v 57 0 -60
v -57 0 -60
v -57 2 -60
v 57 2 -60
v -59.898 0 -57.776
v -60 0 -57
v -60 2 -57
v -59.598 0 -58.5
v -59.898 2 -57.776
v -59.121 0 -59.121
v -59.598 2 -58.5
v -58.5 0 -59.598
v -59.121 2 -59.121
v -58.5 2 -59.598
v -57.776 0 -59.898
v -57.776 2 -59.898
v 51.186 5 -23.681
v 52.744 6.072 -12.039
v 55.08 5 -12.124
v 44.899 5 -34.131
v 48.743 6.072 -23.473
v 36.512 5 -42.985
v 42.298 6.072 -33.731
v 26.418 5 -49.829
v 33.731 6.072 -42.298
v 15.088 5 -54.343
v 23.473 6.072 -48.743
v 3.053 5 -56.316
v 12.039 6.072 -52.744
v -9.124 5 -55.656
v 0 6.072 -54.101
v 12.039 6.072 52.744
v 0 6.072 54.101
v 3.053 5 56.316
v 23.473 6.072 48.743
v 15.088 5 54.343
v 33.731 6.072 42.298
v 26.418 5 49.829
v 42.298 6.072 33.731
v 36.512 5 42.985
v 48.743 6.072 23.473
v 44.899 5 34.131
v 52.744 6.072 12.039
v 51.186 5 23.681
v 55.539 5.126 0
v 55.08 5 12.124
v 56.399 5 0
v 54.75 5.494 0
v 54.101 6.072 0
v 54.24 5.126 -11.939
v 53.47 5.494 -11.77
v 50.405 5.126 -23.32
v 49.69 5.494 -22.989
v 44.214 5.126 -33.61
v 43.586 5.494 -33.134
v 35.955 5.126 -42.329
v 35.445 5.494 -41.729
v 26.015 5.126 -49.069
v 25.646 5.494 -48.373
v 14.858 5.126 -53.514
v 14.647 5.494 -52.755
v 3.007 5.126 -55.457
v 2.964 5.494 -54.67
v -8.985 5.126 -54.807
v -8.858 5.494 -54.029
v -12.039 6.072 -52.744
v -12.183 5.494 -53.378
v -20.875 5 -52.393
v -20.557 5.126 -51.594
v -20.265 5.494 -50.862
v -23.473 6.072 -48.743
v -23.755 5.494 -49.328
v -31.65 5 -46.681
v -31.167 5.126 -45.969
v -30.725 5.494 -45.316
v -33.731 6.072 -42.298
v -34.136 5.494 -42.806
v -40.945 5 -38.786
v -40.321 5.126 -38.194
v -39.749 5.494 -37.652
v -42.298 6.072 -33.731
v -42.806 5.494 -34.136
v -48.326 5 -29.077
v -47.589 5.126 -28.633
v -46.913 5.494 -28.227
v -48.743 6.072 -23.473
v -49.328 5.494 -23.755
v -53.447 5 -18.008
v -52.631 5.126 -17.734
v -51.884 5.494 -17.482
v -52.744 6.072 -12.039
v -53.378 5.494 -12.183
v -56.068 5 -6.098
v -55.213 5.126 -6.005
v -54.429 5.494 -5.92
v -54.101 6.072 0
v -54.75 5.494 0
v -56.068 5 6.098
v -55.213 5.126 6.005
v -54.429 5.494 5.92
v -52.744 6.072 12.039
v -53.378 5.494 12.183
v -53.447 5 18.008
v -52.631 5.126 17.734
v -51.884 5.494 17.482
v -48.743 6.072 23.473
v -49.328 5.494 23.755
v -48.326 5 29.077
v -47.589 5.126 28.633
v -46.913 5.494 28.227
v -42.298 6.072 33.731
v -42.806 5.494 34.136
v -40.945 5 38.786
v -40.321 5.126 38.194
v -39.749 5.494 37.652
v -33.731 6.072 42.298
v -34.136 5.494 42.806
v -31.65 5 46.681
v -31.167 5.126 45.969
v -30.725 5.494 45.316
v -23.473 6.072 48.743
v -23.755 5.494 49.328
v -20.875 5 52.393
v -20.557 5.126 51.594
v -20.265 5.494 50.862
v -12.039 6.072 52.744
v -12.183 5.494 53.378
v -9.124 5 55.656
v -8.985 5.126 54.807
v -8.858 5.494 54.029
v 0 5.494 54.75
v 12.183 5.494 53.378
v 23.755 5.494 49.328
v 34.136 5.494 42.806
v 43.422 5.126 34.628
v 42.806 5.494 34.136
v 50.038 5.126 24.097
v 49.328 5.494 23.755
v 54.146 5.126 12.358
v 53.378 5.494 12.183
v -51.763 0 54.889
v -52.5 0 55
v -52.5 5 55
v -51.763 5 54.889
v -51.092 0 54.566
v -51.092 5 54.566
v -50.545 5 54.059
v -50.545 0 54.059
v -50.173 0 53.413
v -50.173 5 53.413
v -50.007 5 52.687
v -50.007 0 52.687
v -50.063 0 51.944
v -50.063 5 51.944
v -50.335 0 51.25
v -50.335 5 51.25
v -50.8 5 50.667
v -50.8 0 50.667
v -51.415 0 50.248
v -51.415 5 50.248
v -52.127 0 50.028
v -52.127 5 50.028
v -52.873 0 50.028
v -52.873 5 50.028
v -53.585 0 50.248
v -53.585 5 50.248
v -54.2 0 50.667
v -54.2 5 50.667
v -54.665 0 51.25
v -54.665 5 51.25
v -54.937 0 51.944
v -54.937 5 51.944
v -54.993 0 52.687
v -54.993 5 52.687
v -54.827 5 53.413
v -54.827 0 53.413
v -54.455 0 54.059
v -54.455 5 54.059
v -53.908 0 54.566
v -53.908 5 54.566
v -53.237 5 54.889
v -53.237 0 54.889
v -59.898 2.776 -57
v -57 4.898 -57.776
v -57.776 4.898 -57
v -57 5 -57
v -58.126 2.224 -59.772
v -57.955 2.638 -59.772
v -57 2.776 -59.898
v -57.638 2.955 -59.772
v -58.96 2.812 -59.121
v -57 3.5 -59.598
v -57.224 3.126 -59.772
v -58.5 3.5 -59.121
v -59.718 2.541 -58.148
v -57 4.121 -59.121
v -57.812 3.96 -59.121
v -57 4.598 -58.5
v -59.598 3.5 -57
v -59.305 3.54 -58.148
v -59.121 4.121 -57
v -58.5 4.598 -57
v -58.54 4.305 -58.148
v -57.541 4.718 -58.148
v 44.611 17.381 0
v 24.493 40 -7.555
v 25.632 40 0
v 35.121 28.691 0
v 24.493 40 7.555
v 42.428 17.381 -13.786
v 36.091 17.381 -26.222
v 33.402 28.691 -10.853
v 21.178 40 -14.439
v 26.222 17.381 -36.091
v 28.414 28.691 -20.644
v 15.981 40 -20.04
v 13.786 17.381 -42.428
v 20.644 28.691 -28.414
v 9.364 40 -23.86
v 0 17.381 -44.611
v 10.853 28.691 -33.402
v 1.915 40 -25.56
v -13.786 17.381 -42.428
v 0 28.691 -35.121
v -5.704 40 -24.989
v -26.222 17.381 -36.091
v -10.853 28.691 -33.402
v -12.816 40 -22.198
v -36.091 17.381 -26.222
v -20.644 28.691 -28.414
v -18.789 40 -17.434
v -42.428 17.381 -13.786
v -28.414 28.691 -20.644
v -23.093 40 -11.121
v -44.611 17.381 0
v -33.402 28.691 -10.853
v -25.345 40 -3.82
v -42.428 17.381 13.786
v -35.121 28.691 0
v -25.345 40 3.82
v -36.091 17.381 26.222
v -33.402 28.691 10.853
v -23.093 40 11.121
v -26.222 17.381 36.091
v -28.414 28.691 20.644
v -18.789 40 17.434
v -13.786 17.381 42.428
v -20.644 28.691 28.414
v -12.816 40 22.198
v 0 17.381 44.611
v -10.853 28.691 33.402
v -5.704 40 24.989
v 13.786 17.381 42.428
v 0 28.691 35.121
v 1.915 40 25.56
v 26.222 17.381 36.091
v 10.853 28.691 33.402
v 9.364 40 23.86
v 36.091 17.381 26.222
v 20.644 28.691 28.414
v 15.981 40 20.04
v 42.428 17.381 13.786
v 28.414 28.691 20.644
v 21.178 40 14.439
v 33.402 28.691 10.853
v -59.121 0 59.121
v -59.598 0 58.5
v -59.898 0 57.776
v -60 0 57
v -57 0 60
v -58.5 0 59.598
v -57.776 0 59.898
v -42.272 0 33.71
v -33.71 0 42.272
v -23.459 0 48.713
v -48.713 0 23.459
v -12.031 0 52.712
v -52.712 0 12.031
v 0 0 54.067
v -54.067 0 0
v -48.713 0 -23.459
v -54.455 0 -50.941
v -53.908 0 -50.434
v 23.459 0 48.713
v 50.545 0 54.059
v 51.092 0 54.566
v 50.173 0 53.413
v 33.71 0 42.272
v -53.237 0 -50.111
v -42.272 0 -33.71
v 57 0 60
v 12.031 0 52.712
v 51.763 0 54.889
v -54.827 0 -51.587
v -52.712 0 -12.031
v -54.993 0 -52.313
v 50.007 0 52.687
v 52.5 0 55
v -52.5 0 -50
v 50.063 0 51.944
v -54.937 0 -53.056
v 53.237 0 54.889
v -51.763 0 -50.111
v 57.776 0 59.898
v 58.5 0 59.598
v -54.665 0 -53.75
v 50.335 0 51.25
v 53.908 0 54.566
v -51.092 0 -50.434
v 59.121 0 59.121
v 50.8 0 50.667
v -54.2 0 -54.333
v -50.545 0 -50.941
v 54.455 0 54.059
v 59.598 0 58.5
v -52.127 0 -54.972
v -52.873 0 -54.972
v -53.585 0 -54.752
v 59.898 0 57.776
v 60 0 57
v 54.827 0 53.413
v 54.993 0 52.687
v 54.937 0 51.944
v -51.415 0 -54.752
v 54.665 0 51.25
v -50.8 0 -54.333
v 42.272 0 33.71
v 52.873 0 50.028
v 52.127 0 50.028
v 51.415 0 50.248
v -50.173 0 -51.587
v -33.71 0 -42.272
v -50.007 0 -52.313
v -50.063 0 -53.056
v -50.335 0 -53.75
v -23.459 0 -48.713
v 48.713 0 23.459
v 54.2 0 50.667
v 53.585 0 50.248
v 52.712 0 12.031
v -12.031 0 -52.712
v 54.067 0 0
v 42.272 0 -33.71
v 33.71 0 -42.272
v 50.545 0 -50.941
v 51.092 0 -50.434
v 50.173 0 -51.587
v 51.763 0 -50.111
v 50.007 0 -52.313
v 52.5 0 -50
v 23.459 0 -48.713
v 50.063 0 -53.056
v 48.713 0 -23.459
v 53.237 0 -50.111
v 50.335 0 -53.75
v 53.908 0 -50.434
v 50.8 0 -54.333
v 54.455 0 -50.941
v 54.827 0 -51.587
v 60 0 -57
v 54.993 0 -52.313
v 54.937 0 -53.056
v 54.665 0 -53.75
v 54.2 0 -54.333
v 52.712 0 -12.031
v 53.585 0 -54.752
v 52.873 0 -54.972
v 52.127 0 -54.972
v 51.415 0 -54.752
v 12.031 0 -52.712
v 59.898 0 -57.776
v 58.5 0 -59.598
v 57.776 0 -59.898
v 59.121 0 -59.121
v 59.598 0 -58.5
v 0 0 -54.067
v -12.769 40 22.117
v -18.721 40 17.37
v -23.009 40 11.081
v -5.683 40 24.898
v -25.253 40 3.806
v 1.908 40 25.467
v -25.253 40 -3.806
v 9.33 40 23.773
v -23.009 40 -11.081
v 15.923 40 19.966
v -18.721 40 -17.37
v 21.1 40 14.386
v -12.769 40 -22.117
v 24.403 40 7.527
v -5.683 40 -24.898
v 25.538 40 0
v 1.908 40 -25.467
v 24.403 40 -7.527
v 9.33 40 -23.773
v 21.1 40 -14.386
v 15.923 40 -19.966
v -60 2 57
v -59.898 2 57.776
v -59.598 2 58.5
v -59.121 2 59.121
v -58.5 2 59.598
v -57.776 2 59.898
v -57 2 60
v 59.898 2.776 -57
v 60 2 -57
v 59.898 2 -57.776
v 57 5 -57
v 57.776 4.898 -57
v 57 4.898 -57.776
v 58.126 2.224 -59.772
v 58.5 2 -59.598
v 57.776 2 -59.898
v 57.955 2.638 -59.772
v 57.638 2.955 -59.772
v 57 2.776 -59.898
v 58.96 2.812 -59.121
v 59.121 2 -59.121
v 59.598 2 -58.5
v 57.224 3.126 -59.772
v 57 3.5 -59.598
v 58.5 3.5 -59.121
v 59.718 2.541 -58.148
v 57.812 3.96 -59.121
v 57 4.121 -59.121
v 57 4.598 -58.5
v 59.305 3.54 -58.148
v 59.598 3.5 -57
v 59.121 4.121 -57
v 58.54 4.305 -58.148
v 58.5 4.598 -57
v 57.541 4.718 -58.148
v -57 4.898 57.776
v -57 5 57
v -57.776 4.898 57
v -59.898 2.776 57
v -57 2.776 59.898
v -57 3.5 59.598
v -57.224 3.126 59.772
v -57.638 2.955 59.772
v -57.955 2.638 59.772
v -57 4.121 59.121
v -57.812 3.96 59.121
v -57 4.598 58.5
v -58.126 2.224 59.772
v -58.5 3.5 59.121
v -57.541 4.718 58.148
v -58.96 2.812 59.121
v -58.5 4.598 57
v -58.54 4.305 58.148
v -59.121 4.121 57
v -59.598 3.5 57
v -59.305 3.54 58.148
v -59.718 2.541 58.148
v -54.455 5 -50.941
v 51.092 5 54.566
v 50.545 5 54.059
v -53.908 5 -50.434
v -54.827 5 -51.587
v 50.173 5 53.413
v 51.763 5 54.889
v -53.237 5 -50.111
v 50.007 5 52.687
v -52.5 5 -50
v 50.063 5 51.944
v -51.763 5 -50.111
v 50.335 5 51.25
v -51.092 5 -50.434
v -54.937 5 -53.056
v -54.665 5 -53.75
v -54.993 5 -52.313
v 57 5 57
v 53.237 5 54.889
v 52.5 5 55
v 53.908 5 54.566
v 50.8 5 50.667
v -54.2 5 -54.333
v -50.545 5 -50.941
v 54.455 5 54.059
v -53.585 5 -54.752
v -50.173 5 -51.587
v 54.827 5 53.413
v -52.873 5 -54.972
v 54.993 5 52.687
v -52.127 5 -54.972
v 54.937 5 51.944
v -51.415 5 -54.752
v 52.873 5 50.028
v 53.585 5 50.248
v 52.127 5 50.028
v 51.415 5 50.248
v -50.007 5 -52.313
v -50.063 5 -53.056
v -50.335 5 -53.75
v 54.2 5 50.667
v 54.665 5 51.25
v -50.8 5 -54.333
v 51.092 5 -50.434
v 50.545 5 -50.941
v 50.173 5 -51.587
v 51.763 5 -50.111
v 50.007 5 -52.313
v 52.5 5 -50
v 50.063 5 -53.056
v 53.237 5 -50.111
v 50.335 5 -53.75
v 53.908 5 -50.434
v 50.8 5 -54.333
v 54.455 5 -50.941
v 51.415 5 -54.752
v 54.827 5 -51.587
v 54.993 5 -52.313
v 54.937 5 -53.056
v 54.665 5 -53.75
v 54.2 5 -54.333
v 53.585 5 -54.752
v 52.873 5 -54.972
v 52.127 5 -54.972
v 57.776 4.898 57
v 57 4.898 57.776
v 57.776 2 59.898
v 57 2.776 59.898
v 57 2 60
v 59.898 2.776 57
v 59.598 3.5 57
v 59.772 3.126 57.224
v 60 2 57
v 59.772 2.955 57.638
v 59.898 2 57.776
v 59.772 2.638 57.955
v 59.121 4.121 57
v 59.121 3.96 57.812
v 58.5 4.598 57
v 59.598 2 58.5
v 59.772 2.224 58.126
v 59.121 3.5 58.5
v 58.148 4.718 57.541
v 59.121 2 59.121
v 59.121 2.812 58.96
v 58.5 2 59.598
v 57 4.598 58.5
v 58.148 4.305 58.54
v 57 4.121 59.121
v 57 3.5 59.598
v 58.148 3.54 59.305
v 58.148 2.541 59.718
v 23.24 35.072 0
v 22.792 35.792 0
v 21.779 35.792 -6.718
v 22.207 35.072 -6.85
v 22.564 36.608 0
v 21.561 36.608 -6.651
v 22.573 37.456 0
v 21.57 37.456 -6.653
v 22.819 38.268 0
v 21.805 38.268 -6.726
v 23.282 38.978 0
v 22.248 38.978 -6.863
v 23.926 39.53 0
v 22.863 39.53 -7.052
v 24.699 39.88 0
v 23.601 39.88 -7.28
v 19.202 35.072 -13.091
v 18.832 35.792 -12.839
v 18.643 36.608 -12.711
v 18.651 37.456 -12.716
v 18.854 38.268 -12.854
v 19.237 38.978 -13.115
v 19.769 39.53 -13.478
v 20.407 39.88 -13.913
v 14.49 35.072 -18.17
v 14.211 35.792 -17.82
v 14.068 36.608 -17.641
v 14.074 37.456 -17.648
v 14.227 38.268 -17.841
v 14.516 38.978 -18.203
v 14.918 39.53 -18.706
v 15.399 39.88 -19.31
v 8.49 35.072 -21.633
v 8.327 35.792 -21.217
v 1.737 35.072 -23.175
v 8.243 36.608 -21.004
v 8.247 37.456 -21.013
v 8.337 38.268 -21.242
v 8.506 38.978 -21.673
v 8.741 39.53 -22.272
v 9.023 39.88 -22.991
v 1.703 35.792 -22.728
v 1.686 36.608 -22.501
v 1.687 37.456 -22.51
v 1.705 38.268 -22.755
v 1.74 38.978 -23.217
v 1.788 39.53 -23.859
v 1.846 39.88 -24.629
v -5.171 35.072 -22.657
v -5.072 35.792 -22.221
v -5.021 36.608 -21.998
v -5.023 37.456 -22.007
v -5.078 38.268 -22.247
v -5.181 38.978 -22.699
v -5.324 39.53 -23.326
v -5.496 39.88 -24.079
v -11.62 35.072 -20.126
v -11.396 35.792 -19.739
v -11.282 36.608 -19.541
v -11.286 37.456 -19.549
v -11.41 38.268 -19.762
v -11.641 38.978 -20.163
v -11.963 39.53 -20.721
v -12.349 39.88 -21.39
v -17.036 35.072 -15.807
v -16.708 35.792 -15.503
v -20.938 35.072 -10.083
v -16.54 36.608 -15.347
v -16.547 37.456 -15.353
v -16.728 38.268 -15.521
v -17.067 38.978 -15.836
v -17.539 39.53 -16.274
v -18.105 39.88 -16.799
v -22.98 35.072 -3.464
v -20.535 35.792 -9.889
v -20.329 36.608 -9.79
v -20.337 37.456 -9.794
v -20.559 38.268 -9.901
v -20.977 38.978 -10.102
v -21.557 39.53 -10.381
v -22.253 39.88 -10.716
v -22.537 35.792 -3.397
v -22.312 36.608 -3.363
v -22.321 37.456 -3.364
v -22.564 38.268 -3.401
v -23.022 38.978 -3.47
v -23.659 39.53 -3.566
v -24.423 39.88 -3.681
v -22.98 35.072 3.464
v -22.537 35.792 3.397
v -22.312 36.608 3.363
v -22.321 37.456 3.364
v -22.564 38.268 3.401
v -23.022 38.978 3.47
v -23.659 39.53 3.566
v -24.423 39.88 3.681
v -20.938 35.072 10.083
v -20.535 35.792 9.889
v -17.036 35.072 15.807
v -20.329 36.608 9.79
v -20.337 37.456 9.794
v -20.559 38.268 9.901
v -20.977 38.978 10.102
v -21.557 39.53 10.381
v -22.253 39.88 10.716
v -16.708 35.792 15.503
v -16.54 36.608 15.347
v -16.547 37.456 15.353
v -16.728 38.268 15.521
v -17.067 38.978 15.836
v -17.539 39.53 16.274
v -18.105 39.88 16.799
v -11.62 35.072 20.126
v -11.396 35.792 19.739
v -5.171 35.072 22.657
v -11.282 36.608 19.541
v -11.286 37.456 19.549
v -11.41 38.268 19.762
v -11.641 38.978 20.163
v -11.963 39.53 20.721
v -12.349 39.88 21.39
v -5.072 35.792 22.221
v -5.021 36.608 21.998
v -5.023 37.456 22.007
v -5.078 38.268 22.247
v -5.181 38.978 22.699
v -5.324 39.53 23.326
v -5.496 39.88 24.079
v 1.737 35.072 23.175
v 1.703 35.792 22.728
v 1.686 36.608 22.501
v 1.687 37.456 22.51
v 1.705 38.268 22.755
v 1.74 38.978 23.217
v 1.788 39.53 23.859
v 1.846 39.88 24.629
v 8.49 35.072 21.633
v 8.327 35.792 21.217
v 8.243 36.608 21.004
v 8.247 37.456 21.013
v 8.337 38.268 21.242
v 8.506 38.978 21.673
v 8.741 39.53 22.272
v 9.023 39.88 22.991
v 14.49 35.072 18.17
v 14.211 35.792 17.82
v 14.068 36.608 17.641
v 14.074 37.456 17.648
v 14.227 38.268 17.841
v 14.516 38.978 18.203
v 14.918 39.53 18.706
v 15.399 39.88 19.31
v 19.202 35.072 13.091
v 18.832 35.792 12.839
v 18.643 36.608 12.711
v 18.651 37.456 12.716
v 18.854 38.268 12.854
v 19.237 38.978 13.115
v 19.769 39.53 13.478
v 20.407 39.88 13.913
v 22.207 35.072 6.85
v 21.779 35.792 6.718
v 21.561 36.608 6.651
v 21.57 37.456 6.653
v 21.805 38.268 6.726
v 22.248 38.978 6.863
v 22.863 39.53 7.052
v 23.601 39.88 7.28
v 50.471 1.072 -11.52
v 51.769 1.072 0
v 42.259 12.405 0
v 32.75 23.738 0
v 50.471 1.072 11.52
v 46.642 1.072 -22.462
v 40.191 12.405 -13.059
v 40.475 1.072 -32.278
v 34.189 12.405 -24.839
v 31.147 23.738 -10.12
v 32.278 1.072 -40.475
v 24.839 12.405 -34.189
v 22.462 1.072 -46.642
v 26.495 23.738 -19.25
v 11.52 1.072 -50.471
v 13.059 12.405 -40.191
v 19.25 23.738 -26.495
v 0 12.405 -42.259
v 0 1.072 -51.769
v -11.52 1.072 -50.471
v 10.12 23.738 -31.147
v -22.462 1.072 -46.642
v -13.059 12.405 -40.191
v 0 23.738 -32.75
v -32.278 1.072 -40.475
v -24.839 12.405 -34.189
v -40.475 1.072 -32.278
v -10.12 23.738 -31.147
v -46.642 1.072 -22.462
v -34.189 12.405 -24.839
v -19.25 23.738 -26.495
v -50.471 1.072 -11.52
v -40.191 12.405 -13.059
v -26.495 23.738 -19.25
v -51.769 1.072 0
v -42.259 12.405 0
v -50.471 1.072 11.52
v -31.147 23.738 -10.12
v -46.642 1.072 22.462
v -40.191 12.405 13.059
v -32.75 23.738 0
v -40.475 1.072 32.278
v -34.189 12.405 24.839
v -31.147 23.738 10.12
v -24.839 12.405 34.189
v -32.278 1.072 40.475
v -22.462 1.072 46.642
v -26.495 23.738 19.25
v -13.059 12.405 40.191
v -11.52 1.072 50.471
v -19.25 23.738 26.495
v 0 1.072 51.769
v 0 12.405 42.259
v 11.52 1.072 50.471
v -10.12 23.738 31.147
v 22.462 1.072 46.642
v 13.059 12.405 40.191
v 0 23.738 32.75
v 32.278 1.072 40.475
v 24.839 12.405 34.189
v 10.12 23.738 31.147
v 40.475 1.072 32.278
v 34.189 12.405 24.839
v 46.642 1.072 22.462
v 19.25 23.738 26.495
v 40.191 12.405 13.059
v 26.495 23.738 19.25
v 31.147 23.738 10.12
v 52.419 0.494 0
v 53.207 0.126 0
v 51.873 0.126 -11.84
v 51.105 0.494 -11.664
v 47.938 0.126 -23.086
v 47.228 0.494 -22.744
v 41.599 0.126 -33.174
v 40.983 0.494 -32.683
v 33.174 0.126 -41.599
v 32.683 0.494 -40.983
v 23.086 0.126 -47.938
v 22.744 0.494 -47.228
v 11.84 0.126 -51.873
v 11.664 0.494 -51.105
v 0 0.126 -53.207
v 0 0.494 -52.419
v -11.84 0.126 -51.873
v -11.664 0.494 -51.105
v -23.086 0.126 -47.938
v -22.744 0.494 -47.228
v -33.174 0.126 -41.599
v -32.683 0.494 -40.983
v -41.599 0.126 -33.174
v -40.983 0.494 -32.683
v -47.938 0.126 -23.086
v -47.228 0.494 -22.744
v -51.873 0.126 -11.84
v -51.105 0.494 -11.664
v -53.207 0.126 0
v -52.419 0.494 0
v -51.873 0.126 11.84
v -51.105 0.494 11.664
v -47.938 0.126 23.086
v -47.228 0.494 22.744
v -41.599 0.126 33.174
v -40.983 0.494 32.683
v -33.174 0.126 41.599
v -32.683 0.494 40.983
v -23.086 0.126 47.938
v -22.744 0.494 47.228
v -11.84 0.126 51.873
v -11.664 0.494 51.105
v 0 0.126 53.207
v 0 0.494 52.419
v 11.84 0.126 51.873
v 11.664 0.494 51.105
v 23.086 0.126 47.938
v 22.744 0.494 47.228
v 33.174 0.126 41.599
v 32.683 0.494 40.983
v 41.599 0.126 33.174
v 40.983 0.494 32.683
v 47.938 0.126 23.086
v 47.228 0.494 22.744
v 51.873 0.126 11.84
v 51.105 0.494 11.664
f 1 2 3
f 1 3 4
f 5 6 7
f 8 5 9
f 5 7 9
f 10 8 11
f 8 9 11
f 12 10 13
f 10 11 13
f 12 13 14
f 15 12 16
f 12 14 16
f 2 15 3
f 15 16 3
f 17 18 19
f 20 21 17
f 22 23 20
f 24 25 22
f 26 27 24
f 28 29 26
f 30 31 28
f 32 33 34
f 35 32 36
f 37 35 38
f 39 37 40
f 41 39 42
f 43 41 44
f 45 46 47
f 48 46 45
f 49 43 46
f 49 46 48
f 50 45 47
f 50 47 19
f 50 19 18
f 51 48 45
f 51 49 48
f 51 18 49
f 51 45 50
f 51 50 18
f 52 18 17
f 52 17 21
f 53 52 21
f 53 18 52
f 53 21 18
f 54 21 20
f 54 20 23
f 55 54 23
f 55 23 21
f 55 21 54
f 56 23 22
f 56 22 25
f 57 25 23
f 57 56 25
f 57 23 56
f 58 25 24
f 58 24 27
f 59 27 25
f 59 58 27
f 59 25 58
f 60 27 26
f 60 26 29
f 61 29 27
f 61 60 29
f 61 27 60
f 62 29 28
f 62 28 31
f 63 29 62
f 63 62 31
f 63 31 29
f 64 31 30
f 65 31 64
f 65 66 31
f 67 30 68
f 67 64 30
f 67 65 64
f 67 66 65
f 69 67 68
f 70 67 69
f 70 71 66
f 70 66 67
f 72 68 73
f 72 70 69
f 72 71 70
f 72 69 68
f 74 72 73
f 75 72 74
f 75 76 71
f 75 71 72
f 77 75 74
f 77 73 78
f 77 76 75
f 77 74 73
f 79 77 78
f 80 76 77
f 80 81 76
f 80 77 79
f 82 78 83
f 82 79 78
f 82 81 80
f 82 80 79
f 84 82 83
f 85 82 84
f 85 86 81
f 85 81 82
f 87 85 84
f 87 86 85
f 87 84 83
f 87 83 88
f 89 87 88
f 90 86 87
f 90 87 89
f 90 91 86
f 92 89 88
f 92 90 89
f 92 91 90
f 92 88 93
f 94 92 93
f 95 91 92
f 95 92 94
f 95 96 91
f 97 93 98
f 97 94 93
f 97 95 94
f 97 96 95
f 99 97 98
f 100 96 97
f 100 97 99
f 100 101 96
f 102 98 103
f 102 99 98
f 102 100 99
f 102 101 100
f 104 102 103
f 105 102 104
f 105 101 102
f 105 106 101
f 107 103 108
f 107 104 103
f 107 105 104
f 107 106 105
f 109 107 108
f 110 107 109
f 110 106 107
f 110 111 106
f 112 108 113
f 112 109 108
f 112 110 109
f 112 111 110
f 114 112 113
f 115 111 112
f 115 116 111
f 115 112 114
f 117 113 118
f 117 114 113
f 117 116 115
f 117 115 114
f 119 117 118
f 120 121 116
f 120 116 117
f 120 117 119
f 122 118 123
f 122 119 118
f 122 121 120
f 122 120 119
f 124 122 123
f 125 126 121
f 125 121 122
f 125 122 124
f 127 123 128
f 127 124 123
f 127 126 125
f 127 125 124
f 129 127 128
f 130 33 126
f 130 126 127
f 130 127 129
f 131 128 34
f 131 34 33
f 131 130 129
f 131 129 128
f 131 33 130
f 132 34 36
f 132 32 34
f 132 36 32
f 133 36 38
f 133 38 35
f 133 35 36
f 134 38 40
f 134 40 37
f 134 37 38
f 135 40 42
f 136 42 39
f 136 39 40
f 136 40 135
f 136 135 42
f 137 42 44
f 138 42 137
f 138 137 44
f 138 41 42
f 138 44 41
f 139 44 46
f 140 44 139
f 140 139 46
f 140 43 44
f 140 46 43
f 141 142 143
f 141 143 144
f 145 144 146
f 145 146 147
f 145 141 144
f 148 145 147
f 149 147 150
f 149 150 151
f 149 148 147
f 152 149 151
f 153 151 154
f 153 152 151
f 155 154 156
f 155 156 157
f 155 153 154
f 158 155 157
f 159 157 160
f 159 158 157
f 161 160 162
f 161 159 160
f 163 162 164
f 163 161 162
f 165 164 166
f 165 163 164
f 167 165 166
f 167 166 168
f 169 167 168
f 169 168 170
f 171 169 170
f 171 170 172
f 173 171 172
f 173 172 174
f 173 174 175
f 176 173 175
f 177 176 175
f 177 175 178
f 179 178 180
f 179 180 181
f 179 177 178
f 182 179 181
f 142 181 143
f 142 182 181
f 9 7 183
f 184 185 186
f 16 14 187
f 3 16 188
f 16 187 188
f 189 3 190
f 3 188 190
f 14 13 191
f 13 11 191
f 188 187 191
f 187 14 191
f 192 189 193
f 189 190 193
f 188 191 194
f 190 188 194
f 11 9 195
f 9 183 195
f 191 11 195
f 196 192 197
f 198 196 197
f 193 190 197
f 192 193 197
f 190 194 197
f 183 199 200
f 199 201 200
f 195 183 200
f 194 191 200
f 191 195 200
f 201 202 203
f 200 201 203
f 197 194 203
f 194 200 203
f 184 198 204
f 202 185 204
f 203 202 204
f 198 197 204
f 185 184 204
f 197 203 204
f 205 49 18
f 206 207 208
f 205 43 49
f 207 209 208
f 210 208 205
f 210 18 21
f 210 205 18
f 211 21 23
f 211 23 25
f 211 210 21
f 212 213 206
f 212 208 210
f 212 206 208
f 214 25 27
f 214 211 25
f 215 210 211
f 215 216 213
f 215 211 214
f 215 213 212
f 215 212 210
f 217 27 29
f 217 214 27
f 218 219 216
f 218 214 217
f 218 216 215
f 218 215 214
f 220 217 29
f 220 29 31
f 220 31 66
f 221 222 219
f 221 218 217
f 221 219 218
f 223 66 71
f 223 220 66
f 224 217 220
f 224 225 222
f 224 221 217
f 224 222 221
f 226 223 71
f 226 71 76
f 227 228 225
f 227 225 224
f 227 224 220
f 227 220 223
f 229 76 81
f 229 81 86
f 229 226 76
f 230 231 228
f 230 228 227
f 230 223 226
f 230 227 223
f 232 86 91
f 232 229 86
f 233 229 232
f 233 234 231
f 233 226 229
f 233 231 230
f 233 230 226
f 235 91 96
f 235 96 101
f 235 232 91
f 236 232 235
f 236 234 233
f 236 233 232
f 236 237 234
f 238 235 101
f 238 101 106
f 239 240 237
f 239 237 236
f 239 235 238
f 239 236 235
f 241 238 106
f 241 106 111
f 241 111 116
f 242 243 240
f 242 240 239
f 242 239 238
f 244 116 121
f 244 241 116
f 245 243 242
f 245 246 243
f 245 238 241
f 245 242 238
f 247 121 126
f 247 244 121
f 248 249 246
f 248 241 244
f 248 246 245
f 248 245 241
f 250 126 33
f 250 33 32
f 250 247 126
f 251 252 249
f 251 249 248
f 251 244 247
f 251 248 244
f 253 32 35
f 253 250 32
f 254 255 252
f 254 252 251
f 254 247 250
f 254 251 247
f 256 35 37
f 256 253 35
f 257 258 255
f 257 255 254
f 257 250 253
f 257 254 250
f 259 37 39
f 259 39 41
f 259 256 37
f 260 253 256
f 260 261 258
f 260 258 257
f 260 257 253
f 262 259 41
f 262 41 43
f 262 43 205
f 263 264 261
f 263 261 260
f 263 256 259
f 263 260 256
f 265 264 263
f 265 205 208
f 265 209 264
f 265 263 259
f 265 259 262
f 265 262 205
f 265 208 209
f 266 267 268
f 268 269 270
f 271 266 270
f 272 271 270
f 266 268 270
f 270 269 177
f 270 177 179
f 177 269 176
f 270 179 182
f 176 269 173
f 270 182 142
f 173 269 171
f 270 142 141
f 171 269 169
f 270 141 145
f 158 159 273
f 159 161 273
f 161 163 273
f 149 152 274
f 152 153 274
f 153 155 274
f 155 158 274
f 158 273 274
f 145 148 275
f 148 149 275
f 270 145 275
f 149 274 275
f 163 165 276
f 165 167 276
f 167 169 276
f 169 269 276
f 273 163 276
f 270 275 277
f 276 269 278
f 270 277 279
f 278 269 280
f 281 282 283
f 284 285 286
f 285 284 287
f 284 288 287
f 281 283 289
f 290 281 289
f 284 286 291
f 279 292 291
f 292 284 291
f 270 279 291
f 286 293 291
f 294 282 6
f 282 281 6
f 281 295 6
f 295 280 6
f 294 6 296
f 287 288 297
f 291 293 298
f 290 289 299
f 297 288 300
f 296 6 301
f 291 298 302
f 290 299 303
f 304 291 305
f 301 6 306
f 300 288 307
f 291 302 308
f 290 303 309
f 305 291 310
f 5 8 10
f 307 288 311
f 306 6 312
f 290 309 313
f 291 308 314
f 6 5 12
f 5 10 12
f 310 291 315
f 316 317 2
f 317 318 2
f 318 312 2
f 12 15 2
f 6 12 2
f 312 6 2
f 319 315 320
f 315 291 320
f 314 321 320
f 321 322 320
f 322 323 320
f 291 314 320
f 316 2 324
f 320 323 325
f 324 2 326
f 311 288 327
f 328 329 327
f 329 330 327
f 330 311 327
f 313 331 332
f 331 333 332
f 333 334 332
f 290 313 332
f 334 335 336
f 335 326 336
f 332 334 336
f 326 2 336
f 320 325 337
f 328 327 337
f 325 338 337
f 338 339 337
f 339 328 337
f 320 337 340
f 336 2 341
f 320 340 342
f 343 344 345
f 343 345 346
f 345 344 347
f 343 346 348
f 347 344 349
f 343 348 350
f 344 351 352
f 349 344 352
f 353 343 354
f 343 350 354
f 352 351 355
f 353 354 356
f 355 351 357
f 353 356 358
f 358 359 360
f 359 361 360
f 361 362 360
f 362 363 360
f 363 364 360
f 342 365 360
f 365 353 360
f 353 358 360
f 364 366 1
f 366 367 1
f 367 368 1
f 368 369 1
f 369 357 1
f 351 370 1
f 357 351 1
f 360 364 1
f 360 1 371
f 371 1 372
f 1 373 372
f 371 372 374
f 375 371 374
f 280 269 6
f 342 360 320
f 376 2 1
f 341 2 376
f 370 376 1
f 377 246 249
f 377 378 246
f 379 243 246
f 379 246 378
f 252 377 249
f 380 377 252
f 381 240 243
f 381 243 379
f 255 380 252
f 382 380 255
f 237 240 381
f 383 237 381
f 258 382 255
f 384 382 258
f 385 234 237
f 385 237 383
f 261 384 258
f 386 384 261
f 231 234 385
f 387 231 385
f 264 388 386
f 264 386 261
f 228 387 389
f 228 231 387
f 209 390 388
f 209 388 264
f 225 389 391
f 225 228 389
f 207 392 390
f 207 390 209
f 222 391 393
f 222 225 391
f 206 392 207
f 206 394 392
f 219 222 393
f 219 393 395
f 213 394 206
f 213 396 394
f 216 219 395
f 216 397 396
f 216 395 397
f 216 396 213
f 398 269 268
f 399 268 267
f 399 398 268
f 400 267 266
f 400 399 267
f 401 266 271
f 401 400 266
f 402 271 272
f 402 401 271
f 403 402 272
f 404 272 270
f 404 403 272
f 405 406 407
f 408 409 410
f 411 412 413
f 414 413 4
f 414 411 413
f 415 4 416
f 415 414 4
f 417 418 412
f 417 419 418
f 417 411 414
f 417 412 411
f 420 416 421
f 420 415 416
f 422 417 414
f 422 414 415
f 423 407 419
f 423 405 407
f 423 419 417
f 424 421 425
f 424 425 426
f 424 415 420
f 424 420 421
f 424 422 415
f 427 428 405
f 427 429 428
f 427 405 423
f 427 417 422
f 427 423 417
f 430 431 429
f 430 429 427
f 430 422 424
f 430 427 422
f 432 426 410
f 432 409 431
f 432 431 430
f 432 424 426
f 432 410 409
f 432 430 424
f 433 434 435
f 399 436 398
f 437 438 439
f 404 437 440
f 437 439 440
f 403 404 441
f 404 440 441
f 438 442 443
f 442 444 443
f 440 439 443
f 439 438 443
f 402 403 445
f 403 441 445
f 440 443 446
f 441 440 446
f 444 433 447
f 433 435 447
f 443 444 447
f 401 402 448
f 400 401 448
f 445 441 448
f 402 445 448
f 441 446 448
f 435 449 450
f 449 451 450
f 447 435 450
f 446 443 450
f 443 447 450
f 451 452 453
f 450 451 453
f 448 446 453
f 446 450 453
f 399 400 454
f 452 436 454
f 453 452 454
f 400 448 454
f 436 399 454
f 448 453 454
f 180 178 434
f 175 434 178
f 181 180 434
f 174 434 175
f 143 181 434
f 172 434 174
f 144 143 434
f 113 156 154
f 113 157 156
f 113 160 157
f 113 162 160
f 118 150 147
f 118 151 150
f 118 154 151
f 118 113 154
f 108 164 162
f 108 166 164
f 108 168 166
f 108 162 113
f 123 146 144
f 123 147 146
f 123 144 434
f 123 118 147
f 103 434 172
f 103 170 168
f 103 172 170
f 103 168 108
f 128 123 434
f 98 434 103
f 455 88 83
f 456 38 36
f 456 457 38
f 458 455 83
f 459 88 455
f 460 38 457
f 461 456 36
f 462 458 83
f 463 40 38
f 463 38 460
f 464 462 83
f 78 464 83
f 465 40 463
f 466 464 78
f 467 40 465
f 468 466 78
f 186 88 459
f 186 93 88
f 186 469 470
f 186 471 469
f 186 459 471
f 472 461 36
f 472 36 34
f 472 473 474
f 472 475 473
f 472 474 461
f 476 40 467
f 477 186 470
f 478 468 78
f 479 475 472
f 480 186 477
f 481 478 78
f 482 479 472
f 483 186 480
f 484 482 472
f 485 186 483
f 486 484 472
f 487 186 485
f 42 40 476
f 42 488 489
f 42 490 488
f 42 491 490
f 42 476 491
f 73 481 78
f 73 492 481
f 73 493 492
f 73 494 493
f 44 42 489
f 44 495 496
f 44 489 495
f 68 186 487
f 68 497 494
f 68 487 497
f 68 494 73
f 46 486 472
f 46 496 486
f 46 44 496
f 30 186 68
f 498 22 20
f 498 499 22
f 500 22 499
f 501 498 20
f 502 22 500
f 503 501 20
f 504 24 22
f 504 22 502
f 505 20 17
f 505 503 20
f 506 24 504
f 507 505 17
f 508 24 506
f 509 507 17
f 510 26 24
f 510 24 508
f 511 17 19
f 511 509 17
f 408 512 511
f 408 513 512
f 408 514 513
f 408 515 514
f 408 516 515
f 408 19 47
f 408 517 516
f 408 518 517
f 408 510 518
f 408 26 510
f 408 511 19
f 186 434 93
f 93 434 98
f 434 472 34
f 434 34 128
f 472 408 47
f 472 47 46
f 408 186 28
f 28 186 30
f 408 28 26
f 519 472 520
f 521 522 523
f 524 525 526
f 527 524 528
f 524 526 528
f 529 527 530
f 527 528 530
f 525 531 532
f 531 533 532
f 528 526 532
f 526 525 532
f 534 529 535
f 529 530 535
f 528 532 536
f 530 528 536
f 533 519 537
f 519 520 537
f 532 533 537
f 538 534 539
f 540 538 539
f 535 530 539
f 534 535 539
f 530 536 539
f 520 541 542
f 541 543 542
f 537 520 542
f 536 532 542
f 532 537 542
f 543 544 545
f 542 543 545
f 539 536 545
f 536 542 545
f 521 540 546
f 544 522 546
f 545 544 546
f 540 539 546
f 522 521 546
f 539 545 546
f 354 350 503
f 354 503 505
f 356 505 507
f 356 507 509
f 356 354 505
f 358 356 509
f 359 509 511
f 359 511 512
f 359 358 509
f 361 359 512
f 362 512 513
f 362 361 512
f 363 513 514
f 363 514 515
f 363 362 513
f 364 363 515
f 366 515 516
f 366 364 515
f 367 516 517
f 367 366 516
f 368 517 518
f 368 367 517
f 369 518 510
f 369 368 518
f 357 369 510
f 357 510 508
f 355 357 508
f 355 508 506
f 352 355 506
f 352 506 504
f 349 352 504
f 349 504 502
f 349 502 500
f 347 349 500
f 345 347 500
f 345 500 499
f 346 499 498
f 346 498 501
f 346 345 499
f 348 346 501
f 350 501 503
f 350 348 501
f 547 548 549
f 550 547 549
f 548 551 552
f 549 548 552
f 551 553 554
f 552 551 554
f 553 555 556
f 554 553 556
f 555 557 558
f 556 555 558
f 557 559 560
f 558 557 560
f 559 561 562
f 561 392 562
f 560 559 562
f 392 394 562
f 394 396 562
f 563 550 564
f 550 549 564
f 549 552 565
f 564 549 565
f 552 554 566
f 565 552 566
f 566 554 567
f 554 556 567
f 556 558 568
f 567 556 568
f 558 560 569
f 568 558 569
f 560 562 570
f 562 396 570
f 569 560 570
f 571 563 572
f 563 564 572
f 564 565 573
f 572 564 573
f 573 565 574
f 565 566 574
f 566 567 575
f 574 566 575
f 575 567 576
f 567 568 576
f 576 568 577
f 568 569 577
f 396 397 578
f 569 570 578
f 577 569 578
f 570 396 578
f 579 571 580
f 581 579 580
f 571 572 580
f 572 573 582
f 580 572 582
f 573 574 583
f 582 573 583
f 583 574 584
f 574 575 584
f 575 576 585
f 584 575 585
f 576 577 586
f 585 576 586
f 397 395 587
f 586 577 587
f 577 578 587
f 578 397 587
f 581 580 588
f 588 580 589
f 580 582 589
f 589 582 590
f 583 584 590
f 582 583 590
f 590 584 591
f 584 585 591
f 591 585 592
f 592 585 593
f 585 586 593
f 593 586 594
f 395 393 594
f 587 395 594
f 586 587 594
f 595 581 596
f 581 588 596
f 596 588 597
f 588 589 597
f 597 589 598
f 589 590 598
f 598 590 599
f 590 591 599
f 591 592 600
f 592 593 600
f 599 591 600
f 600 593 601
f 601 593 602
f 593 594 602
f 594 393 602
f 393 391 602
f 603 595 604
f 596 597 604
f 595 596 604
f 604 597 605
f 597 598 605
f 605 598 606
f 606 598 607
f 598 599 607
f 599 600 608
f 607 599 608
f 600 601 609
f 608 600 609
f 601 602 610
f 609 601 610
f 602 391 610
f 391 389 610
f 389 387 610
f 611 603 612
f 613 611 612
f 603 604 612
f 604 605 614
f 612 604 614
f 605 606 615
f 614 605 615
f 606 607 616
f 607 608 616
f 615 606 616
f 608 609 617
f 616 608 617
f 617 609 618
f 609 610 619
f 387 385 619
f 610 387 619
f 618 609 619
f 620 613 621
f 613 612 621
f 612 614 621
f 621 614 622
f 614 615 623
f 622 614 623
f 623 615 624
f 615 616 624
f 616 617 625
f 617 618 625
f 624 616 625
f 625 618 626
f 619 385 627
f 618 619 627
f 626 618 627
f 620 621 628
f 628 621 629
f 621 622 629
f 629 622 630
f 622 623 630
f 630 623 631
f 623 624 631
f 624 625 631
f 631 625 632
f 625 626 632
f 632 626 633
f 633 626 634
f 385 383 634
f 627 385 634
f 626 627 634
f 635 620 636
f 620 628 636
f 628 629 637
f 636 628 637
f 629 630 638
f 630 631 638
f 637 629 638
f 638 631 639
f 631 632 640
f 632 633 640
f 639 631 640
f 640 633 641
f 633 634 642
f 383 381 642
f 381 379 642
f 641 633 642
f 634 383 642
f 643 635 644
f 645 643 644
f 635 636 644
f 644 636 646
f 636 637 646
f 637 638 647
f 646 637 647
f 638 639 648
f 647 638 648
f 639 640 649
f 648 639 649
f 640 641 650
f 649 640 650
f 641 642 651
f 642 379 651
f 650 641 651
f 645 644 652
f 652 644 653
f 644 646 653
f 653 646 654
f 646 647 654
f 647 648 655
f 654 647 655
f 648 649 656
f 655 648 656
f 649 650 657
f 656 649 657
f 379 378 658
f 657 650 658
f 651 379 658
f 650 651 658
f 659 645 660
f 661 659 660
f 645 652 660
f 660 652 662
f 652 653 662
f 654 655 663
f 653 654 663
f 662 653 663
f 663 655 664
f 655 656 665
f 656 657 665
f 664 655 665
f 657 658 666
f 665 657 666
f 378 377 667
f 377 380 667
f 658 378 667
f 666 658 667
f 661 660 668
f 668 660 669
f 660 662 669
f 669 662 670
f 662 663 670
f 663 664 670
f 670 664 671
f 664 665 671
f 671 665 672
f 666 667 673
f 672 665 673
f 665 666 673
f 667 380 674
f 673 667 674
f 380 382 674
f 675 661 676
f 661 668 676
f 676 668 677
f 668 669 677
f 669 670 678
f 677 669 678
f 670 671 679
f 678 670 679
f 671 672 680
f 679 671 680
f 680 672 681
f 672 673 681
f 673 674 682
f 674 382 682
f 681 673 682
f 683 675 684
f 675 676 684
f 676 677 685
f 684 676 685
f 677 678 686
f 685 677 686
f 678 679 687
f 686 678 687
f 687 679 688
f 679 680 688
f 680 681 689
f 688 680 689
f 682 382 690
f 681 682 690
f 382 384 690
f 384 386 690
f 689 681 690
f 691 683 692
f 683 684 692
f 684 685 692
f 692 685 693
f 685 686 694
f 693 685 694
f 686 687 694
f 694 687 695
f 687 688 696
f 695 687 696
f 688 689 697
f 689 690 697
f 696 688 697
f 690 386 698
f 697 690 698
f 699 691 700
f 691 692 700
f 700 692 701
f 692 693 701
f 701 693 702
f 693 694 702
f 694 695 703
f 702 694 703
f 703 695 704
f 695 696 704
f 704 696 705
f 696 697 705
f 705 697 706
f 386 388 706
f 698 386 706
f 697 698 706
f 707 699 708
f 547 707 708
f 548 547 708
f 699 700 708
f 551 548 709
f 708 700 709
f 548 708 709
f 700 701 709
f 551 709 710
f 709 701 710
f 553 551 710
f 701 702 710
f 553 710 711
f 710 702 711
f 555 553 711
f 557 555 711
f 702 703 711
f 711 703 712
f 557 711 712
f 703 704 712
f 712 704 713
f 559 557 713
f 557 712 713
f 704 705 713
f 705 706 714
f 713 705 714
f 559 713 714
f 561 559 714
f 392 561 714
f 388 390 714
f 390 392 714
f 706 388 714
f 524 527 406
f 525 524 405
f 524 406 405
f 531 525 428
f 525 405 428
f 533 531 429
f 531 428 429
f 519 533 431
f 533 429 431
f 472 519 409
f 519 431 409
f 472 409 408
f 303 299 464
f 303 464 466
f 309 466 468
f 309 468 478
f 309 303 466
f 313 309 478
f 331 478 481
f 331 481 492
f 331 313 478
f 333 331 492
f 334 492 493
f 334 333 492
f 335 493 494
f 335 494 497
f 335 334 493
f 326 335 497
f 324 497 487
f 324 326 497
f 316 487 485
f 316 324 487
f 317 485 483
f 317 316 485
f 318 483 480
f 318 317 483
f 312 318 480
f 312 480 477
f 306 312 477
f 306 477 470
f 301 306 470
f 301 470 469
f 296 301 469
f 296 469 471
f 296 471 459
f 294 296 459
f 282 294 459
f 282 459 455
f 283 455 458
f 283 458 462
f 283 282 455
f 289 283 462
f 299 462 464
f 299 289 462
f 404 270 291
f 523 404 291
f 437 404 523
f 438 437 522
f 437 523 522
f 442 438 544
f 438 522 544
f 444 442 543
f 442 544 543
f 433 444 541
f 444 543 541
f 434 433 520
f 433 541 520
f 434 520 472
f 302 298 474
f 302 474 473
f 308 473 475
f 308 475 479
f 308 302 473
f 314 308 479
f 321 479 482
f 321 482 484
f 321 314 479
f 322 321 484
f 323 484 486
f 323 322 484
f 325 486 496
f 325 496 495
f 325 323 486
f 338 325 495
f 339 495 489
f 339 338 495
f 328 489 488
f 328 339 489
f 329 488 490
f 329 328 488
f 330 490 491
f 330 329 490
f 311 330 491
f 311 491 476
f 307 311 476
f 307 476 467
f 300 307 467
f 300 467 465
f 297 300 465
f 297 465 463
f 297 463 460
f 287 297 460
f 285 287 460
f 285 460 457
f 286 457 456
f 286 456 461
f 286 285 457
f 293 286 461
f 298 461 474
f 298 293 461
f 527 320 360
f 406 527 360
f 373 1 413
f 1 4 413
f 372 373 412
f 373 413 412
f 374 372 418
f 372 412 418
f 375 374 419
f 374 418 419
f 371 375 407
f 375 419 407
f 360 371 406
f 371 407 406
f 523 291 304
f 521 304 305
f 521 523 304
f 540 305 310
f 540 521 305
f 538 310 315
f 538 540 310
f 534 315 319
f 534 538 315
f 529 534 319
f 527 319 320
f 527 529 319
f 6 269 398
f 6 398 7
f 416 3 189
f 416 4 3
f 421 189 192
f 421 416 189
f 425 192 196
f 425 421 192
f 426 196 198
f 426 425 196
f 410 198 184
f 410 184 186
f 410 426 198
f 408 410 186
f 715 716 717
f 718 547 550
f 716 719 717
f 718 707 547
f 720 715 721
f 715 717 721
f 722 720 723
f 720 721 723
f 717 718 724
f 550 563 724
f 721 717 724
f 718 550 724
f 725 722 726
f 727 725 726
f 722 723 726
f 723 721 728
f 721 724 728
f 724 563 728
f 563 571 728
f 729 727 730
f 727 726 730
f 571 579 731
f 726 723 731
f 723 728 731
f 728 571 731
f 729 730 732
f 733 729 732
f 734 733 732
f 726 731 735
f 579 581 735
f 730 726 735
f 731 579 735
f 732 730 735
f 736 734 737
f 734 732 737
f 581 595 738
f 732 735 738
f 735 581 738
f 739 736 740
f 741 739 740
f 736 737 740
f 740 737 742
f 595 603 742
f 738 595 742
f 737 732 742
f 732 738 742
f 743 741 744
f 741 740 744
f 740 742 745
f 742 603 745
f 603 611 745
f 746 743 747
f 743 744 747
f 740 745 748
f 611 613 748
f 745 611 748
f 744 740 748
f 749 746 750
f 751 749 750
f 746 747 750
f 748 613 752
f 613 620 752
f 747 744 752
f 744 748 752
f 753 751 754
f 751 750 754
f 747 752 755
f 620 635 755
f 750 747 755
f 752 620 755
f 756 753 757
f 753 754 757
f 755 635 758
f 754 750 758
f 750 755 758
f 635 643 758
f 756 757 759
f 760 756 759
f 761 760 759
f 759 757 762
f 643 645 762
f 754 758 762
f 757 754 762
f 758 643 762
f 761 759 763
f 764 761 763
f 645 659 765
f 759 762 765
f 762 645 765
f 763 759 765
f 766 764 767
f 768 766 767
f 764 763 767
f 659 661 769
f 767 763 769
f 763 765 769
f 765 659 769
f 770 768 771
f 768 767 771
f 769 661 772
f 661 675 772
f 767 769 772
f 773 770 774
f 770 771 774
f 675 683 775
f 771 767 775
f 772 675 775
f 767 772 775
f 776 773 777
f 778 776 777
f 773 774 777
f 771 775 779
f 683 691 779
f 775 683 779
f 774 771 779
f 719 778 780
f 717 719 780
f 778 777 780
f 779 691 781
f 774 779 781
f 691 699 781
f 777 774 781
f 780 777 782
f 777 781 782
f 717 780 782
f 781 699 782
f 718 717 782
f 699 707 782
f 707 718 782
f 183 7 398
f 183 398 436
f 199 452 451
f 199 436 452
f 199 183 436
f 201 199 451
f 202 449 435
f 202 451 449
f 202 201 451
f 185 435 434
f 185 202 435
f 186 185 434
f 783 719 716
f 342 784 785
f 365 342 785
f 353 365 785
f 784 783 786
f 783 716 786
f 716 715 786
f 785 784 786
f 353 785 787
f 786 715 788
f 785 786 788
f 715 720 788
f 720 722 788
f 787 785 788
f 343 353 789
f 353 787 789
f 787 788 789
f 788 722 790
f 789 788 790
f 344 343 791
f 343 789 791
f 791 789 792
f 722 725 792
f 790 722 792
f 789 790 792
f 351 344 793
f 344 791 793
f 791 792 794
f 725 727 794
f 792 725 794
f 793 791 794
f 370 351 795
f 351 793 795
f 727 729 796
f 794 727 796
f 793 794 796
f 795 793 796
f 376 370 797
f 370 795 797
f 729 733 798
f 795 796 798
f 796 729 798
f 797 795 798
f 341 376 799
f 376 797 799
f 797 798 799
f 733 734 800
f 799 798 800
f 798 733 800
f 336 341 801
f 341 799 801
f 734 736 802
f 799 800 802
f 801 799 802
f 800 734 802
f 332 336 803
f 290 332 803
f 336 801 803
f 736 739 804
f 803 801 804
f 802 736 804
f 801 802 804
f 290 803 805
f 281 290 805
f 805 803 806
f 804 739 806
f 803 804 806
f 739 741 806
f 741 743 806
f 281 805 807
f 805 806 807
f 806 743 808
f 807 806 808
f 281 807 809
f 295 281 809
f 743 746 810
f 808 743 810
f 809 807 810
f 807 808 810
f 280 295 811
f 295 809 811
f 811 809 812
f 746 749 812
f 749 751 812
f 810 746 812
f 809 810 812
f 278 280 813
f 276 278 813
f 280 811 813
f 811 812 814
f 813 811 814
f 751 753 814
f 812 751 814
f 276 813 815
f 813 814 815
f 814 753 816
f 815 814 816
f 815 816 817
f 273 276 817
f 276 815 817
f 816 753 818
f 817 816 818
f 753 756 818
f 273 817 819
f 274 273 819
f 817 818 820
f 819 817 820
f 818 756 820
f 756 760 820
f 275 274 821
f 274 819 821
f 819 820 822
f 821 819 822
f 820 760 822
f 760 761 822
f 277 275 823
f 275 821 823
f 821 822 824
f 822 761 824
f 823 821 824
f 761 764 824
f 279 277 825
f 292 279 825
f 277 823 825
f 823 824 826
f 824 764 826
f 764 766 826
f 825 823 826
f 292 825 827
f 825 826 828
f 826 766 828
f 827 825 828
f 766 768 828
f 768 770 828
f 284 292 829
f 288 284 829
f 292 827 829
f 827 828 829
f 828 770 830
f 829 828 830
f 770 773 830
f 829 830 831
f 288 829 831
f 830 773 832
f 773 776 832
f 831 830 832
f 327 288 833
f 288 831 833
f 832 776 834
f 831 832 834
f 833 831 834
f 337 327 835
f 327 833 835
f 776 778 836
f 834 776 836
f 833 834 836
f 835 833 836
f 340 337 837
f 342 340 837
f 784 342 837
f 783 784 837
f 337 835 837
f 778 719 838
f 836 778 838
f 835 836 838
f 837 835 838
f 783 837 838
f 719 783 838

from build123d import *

# Parameters (mm, degrees)
SKETCH1_W           = 120
SKETCH1_H           = 120
SKETCH1_R           = 2.5
BOSS_EXTRUDE1_DEPTH = 5
SKETCH2_R           = 55
BOSS_EXTRUDE2_DEPTH = 35
BOSS_EXTRUDE2_TAPER = 40
FILLET1_R           = 3
FILLET2_R           = 3
FILLET3_R           = 3


# Read off the part's stored shape, not the designer's step: Shell1
with BuildPart() as part:
    # Sketch1 → Boss-Extrude1 (new body)
    with BuildSketch(Plane(origin=(0, 0, 0), x_dir=(1, 0, 0), z_dir=(0, 1, 0))):
        Rectangle(SKETCH1_W, SKETCH1_H)
        with Locations(Location((-52.5, 52.5, 0), (0, 0, 270))):
            Circle(SKETCH1_R, mode=Mode.SUBTRACT)
        with Locations(Location((52.5, 52.5, 0), (0, 0, 270))):
            Circle(SKETCH1_R, mode=Mode.SUBTRACT)
        with Locations(Location((52.5, -52.5, 0), (0, 0, 270))):
            Circle(SKETCH1_R, mode=Mode.SUBTRACT)
        with Locations(Location((-52.5, -52.5, 0), (0, 0, 270))):
            Circle(SKETCH1_R, mode=Mode.SUBTRACT)
    extrude(amount=BOSS_EXTRUDE1_DEPTH)

    # Sketch2 → Boss-Extrude2 (add)
    with BuildSketch(Plane(origin=(0, 5, 0), x_dir=(1, 0, 0), z_dir=(0, 1, 0))):
        Circle(SKETCH2_R)
    extrude(amount=BOSS_EXTRUDE2_DEPTH, taper=BOSS_EXTRUDE2_TAPER)

    # Shell1 outline → Shell1 (revolve, cut)
    with BuildSketch(Plane.XY):
        Polygon((0, 0), (52.668461709, 0), (19.104476462, 40), (0, 40), align=None)
    revolve(axis=Axis((0, 0, 0), (0, 1, 0)), mode=Mode.SUBTRACT)

    # Fillet1
    fillet1_edges = [part.edges().sort_by_distance(p)[0] for p in [
        (-55, 5, 0),
        (-19.104476462, 40, 0),
    ]]
    fillet(fillet1_edges, radius=FILLET1_R)

    # Fillet2
    fillet2_edges = [part.edges().sort_by_distance(p)[0] for p in [
        (-52.668461709, 0, 0),
    ]]
    fillet(fillet2_edges, radius=FILLET2_R)

    # Fillet3
    fillet3_edges = [part.edges().sort_by_distance(p)[0] for p in [
        (-60, 5, 0),
        (0, 5, 60),
        (60, 5, 0),
        (60, 2.5, 60),
        (-60, 2.5, 60),
        (-60, 2.5, -60),
        (60, 2.5, -60),
        (0, 5, -60),
    ]]
    fillet(fillet3_edges, radius=FILLET3_R)


solid = part.part
